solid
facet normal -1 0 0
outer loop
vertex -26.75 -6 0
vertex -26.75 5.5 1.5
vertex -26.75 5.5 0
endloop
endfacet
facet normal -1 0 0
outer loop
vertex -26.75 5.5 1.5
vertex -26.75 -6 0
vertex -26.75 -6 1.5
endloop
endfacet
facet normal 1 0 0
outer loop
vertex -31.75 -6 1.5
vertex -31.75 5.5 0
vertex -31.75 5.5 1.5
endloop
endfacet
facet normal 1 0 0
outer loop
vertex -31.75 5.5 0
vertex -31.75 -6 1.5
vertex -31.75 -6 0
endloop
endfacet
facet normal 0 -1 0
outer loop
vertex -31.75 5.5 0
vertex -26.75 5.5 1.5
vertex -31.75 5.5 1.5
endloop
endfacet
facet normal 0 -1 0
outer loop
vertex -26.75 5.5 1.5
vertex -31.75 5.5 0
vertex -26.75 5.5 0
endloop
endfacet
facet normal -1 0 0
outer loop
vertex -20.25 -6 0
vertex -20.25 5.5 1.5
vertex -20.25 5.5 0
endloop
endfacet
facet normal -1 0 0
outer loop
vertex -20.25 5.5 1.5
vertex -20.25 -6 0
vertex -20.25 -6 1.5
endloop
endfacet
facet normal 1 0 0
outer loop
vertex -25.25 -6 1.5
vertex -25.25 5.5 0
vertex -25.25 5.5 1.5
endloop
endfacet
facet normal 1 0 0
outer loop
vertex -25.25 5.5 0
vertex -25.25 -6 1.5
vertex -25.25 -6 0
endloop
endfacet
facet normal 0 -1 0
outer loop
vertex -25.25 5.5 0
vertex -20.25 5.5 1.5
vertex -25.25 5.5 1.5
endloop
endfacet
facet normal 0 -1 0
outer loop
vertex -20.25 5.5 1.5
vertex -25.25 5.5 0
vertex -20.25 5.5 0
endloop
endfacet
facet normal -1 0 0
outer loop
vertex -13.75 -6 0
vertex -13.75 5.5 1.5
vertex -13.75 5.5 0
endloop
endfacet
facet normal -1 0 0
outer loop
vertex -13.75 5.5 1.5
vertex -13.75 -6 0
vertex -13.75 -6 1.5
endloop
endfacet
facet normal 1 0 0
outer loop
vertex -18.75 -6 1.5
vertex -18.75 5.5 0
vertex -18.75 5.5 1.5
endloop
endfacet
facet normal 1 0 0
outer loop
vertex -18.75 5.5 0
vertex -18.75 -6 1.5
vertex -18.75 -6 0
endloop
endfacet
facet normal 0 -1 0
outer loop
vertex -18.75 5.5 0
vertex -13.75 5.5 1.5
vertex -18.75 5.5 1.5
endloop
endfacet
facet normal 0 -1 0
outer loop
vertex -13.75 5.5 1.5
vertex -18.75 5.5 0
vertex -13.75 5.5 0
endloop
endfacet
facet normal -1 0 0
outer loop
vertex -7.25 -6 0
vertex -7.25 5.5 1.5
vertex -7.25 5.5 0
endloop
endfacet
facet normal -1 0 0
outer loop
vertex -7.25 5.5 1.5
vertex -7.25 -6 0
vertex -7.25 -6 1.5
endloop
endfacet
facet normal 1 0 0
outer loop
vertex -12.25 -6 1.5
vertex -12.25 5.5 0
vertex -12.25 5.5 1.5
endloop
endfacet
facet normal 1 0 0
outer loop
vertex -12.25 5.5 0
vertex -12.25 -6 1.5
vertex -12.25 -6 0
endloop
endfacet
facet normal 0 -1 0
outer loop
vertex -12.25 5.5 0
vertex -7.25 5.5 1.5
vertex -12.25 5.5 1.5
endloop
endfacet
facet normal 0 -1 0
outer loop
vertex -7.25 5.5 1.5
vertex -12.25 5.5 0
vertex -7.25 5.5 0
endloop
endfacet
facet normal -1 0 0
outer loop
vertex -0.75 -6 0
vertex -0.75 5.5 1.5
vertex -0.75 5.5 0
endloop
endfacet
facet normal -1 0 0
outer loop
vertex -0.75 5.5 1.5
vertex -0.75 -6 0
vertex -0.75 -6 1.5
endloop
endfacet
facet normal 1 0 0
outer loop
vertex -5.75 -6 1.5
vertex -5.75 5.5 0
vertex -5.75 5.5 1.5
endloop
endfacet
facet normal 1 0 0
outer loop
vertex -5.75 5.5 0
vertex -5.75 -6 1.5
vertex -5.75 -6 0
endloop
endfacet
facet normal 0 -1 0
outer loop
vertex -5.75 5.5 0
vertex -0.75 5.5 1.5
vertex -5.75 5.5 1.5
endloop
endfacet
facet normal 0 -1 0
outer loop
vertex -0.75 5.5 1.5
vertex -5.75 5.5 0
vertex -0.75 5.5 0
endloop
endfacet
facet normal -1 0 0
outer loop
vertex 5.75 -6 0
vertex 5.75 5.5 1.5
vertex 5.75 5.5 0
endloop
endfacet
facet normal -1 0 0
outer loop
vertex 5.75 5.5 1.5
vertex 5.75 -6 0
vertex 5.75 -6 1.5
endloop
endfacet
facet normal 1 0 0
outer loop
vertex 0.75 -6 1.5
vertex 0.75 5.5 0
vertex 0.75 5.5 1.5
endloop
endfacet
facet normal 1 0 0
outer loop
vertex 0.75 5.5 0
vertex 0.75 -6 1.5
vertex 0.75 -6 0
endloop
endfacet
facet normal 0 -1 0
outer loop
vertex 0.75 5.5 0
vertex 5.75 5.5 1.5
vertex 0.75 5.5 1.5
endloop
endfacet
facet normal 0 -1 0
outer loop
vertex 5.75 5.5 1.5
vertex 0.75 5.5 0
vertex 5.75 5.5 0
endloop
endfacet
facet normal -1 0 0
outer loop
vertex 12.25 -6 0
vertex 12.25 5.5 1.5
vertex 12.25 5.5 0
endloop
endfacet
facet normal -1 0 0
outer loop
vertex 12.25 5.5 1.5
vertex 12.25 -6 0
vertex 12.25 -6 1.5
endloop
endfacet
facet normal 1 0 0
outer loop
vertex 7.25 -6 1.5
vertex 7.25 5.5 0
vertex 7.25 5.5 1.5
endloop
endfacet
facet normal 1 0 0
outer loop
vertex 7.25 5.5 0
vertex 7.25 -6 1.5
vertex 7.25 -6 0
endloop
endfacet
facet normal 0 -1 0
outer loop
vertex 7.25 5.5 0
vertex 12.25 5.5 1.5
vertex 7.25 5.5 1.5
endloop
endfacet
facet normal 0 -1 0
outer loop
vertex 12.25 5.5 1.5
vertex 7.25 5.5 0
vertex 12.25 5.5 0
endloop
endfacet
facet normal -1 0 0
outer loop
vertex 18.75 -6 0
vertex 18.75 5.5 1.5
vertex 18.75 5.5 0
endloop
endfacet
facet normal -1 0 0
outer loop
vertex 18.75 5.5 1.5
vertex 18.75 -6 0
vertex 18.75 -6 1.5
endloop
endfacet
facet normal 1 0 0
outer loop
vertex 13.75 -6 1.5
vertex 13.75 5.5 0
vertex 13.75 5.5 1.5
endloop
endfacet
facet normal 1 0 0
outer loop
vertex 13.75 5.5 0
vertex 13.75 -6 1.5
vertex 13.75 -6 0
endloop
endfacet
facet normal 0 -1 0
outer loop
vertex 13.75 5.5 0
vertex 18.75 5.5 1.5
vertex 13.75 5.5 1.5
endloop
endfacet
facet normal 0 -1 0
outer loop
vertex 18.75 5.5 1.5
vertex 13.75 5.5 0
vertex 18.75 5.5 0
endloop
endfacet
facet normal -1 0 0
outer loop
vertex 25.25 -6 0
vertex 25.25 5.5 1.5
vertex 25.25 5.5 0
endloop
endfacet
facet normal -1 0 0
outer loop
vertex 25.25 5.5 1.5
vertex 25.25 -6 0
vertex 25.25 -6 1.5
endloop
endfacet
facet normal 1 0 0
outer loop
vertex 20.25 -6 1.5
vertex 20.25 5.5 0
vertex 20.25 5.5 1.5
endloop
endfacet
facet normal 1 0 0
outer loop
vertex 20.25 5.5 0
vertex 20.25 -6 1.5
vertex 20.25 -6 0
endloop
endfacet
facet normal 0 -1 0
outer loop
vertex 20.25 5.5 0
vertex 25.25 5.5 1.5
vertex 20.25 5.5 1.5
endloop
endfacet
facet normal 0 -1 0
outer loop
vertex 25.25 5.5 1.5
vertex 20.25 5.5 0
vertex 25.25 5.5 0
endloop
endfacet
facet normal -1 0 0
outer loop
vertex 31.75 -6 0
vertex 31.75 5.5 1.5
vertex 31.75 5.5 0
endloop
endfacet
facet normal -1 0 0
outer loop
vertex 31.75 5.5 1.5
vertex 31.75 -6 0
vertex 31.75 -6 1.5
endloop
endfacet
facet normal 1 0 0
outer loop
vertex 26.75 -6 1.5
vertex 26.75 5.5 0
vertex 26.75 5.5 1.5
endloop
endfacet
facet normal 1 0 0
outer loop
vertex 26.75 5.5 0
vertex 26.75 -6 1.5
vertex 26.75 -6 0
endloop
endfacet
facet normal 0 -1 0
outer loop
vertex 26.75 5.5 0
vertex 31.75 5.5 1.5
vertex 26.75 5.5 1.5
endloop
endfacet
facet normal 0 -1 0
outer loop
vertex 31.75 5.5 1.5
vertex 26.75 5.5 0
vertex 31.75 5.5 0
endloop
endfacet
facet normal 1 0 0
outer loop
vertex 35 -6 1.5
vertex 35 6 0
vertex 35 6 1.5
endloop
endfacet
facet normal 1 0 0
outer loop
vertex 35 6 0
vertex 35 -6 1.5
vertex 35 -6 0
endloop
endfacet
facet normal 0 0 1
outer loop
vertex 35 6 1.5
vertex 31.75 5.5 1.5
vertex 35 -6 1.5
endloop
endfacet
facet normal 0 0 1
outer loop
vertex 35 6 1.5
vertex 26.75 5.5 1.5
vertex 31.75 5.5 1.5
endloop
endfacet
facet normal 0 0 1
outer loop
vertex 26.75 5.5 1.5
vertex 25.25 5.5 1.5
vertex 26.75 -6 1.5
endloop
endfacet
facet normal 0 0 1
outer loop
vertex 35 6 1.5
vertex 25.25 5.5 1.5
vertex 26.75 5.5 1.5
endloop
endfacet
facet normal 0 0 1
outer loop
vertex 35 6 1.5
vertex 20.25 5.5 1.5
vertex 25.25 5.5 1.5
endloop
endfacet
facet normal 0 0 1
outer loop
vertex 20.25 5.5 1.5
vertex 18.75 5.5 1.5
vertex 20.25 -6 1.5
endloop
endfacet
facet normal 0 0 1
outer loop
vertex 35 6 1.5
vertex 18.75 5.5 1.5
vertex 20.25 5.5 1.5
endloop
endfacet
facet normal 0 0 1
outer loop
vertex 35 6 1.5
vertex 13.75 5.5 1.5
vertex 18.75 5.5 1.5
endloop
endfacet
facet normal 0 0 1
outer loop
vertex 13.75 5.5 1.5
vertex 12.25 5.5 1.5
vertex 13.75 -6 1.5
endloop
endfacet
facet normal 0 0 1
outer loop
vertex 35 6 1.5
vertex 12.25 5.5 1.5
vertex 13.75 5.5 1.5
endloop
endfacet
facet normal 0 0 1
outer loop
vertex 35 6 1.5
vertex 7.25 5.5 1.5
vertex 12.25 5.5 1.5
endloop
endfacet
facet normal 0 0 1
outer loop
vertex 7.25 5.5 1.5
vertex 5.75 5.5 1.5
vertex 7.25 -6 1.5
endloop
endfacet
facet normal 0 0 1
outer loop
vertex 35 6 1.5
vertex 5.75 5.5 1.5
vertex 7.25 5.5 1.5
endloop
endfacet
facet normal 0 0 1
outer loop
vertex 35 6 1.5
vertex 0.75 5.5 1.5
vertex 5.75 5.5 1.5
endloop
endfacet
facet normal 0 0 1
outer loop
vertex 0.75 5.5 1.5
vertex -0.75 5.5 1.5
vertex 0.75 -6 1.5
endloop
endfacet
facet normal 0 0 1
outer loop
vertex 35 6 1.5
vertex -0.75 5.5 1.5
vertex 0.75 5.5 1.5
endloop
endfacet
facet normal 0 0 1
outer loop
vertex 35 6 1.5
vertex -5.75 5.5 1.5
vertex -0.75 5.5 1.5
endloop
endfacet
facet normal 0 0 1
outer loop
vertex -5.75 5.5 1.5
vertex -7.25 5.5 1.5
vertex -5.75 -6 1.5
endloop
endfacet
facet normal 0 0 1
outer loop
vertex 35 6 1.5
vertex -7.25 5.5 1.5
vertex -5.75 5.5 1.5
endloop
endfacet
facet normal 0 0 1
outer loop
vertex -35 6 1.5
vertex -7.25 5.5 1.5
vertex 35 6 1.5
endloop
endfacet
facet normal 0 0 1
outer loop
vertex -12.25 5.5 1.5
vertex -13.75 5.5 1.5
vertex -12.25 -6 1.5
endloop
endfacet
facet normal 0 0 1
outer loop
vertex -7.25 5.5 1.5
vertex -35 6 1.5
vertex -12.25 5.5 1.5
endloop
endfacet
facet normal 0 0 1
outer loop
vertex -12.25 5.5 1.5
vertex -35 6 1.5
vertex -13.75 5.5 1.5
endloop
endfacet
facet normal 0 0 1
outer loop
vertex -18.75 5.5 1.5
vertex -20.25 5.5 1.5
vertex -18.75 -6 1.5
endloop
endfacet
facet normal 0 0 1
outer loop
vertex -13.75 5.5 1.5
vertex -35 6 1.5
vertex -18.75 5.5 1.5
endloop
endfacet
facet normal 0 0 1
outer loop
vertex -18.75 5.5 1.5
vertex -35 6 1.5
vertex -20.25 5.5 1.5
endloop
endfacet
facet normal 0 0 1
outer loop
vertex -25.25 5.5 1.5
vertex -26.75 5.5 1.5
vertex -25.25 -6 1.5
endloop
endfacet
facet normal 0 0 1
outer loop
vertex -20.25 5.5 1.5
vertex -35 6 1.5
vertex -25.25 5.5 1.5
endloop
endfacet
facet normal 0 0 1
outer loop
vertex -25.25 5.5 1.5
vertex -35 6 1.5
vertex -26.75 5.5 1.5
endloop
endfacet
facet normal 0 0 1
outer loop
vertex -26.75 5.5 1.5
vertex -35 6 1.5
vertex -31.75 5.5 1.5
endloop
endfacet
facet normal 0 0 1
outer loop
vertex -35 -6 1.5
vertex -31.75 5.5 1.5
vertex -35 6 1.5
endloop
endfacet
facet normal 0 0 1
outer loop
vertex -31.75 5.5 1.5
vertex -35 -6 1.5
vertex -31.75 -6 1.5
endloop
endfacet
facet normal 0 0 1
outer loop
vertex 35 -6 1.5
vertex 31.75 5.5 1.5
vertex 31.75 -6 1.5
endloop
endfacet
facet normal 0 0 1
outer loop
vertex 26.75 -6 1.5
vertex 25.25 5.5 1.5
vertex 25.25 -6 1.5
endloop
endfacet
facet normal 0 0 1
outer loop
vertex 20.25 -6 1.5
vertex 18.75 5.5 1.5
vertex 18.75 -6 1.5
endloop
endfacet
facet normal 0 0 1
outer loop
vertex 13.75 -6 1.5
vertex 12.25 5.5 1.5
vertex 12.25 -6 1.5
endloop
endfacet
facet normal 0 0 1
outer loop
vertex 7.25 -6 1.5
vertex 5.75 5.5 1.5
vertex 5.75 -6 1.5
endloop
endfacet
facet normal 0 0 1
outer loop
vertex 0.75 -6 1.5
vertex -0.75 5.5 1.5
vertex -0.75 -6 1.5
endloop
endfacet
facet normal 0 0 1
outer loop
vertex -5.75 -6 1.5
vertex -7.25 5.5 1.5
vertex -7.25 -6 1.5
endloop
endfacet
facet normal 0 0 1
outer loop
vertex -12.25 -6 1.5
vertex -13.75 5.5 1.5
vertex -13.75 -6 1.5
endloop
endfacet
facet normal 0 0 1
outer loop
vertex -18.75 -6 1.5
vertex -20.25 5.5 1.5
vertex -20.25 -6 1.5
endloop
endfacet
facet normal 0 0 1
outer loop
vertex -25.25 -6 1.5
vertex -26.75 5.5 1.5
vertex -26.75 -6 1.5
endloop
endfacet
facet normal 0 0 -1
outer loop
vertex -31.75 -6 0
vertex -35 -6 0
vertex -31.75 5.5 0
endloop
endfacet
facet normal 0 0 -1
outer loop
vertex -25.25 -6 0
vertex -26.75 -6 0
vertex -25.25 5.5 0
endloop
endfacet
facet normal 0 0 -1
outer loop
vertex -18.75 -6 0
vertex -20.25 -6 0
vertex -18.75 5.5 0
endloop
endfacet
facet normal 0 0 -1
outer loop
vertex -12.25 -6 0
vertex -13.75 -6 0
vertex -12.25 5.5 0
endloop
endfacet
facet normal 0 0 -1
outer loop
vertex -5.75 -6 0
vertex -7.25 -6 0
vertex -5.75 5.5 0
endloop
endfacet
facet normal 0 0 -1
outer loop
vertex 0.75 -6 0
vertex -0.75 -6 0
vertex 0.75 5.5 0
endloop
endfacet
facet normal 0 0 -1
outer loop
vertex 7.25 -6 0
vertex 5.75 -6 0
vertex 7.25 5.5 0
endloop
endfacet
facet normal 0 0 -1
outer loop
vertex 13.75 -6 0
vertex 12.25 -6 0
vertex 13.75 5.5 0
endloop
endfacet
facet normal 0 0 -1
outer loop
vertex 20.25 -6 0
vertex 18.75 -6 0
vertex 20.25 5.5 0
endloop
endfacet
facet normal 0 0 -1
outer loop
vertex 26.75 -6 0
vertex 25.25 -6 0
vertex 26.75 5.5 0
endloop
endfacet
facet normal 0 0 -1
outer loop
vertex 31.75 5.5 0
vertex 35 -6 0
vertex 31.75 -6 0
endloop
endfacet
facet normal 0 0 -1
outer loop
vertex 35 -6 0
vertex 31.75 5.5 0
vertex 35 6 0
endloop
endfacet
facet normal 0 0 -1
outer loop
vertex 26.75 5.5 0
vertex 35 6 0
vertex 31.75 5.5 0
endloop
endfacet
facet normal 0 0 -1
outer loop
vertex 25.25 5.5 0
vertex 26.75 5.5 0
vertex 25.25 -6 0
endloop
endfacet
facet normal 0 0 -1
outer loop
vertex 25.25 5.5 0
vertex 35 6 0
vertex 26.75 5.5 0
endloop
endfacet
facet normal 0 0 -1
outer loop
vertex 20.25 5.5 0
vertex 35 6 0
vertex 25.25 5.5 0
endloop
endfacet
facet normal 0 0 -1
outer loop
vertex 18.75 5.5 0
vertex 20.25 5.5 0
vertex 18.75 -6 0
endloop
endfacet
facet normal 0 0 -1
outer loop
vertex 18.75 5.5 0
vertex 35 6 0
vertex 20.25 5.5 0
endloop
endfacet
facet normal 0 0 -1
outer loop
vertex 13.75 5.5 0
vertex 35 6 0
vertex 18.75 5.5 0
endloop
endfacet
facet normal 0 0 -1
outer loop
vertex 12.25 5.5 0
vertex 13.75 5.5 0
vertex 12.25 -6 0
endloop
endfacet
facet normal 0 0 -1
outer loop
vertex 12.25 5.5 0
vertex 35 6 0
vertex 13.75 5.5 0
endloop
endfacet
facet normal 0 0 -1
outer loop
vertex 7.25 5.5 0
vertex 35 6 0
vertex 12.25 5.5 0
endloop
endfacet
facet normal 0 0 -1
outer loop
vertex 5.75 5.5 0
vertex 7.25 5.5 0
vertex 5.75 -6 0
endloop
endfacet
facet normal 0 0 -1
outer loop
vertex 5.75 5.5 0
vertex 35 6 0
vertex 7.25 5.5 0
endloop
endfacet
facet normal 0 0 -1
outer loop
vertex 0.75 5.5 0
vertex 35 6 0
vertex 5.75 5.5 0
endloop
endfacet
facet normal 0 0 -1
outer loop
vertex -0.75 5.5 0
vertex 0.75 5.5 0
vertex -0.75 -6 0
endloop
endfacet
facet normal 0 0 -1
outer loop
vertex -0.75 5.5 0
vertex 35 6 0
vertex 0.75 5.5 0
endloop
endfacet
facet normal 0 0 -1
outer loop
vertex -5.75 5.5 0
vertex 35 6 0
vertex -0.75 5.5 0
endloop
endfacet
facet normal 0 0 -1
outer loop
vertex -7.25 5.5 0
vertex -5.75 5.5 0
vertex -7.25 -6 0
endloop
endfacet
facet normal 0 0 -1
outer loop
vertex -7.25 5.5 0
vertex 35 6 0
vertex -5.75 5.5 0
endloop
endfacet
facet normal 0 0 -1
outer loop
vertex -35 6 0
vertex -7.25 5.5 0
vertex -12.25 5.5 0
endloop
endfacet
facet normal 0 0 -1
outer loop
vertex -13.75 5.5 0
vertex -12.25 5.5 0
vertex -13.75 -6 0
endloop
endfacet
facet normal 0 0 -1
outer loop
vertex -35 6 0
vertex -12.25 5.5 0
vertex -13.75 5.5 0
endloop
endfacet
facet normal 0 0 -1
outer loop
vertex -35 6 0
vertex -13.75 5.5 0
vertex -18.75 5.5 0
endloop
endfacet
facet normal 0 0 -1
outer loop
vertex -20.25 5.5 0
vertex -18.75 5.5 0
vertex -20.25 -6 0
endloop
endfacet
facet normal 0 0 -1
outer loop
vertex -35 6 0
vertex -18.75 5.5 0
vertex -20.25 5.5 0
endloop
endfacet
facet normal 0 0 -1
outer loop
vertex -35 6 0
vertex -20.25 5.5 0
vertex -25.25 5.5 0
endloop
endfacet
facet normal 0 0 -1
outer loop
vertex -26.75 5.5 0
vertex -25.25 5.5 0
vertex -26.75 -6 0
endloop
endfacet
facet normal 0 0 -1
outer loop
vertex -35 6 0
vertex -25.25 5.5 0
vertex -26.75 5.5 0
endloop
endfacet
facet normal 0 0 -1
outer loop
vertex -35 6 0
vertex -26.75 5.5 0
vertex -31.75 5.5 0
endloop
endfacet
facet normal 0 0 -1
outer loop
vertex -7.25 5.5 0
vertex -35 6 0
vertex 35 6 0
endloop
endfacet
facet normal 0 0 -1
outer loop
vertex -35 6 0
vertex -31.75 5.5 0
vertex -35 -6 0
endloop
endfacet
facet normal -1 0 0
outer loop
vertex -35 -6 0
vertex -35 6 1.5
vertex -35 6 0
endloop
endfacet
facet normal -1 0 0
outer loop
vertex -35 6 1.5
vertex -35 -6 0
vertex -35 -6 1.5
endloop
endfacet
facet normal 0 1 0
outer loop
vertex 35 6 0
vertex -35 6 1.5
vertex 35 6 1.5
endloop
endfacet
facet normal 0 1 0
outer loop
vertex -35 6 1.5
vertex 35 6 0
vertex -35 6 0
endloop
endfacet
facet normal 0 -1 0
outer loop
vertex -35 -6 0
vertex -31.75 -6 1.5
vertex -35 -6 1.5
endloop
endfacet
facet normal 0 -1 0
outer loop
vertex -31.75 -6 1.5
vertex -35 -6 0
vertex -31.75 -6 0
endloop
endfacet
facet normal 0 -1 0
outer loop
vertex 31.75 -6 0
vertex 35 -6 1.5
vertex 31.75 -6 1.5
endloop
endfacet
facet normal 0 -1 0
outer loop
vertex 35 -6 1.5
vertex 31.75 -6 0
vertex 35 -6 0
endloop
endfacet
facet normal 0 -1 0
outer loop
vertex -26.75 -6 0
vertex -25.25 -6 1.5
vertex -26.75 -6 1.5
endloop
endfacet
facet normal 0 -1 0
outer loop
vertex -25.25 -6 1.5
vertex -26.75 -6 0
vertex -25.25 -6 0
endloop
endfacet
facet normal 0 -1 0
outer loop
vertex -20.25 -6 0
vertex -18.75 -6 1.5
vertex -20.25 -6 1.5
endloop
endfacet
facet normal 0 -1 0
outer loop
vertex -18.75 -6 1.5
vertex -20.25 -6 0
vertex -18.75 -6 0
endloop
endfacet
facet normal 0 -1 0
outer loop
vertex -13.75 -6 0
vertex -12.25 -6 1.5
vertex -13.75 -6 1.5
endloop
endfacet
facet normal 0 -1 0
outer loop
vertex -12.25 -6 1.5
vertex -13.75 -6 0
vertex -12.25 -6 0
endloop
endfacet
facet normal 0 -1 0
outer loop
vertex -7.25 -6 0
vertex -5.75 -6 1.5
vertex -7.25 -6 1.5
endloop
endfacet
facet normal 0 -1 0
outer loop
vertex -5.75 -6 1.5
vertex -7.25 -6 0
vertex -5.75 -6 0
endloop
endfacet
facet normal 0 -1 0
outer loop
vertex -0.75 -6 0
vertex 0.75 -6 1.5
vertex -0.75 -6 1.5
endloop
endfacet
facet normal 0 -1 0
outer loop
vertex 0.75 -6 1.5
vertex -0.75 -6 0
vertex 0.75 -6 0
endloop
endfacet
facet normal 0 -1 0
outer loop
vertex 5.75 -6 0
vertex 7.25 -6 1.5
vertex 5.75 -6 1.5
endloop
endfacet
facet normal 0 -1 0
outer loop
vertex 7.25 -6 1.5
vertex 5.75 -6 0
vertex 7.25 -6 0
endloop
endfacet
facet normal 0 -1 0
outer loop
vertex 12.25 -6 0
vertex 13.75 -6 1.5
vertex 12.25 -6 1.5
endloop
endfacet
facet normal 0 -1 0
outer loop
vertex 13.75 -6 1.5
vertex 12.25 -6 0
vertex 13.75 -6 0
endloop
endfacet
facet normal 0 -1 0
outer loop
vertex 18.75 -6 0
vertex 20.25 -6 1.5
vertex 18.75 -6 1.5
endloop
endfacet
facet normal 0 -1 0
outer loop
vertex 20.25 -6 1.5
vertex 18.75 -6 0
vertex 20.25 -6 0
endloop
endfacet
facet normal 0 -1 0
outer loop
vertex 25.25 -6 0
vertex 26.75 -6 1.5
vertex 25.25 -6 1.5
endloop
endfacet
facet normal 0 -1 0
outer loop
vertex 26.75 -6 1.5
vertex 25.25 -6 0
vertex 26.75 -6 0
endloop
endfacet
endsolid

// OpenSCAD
// 10-well agarose gel comb, printed lying flat
// Units: mm

// ---- Parameters ----
comb_length    = 70;    // spine length (X)
comb_width     = 12;    // spine width (Y)
comb_thickness = 1.5;   // plate thickness (Z)

tooth_count    = 10;    // number of teeth
tooth_width    = 5.0;   // tooth width (X)
tooth_length   = 12;    // tooth length (Y)
tooth_gap      = 1.5;   // gap between teeth (X)

cut_extra      = 0.5;   // overshoot for clean cuts
$fn            = 64;    // curve resolution

// ---- Derived ----
pitch   = tooth_width + tooth_gap;
x0      = -(tooth_count - 1) * pitch / 2;   // first tooth centre (row centred)
reach   = tooth_length + cut_extra;         // tooth tip extension past edge

// ---- Model ----
difference() {
    // Base plate
    translate([-comb_length / 2, -comb_width / 2, 0])
        cube([comb_length, comb_width, comb_thickness]);

    // Teeth, cut from -Y side
    for (i = [0 : tooth_count - 1])
        translate([x0 + i * pitch - tooth_width / 2,
                   -comb_width / 2 - cut_extra,
                   -cut_extra])
            cube([tooth_width, tooth_length, comb_thickness + 2 * cut_extra]);
}
